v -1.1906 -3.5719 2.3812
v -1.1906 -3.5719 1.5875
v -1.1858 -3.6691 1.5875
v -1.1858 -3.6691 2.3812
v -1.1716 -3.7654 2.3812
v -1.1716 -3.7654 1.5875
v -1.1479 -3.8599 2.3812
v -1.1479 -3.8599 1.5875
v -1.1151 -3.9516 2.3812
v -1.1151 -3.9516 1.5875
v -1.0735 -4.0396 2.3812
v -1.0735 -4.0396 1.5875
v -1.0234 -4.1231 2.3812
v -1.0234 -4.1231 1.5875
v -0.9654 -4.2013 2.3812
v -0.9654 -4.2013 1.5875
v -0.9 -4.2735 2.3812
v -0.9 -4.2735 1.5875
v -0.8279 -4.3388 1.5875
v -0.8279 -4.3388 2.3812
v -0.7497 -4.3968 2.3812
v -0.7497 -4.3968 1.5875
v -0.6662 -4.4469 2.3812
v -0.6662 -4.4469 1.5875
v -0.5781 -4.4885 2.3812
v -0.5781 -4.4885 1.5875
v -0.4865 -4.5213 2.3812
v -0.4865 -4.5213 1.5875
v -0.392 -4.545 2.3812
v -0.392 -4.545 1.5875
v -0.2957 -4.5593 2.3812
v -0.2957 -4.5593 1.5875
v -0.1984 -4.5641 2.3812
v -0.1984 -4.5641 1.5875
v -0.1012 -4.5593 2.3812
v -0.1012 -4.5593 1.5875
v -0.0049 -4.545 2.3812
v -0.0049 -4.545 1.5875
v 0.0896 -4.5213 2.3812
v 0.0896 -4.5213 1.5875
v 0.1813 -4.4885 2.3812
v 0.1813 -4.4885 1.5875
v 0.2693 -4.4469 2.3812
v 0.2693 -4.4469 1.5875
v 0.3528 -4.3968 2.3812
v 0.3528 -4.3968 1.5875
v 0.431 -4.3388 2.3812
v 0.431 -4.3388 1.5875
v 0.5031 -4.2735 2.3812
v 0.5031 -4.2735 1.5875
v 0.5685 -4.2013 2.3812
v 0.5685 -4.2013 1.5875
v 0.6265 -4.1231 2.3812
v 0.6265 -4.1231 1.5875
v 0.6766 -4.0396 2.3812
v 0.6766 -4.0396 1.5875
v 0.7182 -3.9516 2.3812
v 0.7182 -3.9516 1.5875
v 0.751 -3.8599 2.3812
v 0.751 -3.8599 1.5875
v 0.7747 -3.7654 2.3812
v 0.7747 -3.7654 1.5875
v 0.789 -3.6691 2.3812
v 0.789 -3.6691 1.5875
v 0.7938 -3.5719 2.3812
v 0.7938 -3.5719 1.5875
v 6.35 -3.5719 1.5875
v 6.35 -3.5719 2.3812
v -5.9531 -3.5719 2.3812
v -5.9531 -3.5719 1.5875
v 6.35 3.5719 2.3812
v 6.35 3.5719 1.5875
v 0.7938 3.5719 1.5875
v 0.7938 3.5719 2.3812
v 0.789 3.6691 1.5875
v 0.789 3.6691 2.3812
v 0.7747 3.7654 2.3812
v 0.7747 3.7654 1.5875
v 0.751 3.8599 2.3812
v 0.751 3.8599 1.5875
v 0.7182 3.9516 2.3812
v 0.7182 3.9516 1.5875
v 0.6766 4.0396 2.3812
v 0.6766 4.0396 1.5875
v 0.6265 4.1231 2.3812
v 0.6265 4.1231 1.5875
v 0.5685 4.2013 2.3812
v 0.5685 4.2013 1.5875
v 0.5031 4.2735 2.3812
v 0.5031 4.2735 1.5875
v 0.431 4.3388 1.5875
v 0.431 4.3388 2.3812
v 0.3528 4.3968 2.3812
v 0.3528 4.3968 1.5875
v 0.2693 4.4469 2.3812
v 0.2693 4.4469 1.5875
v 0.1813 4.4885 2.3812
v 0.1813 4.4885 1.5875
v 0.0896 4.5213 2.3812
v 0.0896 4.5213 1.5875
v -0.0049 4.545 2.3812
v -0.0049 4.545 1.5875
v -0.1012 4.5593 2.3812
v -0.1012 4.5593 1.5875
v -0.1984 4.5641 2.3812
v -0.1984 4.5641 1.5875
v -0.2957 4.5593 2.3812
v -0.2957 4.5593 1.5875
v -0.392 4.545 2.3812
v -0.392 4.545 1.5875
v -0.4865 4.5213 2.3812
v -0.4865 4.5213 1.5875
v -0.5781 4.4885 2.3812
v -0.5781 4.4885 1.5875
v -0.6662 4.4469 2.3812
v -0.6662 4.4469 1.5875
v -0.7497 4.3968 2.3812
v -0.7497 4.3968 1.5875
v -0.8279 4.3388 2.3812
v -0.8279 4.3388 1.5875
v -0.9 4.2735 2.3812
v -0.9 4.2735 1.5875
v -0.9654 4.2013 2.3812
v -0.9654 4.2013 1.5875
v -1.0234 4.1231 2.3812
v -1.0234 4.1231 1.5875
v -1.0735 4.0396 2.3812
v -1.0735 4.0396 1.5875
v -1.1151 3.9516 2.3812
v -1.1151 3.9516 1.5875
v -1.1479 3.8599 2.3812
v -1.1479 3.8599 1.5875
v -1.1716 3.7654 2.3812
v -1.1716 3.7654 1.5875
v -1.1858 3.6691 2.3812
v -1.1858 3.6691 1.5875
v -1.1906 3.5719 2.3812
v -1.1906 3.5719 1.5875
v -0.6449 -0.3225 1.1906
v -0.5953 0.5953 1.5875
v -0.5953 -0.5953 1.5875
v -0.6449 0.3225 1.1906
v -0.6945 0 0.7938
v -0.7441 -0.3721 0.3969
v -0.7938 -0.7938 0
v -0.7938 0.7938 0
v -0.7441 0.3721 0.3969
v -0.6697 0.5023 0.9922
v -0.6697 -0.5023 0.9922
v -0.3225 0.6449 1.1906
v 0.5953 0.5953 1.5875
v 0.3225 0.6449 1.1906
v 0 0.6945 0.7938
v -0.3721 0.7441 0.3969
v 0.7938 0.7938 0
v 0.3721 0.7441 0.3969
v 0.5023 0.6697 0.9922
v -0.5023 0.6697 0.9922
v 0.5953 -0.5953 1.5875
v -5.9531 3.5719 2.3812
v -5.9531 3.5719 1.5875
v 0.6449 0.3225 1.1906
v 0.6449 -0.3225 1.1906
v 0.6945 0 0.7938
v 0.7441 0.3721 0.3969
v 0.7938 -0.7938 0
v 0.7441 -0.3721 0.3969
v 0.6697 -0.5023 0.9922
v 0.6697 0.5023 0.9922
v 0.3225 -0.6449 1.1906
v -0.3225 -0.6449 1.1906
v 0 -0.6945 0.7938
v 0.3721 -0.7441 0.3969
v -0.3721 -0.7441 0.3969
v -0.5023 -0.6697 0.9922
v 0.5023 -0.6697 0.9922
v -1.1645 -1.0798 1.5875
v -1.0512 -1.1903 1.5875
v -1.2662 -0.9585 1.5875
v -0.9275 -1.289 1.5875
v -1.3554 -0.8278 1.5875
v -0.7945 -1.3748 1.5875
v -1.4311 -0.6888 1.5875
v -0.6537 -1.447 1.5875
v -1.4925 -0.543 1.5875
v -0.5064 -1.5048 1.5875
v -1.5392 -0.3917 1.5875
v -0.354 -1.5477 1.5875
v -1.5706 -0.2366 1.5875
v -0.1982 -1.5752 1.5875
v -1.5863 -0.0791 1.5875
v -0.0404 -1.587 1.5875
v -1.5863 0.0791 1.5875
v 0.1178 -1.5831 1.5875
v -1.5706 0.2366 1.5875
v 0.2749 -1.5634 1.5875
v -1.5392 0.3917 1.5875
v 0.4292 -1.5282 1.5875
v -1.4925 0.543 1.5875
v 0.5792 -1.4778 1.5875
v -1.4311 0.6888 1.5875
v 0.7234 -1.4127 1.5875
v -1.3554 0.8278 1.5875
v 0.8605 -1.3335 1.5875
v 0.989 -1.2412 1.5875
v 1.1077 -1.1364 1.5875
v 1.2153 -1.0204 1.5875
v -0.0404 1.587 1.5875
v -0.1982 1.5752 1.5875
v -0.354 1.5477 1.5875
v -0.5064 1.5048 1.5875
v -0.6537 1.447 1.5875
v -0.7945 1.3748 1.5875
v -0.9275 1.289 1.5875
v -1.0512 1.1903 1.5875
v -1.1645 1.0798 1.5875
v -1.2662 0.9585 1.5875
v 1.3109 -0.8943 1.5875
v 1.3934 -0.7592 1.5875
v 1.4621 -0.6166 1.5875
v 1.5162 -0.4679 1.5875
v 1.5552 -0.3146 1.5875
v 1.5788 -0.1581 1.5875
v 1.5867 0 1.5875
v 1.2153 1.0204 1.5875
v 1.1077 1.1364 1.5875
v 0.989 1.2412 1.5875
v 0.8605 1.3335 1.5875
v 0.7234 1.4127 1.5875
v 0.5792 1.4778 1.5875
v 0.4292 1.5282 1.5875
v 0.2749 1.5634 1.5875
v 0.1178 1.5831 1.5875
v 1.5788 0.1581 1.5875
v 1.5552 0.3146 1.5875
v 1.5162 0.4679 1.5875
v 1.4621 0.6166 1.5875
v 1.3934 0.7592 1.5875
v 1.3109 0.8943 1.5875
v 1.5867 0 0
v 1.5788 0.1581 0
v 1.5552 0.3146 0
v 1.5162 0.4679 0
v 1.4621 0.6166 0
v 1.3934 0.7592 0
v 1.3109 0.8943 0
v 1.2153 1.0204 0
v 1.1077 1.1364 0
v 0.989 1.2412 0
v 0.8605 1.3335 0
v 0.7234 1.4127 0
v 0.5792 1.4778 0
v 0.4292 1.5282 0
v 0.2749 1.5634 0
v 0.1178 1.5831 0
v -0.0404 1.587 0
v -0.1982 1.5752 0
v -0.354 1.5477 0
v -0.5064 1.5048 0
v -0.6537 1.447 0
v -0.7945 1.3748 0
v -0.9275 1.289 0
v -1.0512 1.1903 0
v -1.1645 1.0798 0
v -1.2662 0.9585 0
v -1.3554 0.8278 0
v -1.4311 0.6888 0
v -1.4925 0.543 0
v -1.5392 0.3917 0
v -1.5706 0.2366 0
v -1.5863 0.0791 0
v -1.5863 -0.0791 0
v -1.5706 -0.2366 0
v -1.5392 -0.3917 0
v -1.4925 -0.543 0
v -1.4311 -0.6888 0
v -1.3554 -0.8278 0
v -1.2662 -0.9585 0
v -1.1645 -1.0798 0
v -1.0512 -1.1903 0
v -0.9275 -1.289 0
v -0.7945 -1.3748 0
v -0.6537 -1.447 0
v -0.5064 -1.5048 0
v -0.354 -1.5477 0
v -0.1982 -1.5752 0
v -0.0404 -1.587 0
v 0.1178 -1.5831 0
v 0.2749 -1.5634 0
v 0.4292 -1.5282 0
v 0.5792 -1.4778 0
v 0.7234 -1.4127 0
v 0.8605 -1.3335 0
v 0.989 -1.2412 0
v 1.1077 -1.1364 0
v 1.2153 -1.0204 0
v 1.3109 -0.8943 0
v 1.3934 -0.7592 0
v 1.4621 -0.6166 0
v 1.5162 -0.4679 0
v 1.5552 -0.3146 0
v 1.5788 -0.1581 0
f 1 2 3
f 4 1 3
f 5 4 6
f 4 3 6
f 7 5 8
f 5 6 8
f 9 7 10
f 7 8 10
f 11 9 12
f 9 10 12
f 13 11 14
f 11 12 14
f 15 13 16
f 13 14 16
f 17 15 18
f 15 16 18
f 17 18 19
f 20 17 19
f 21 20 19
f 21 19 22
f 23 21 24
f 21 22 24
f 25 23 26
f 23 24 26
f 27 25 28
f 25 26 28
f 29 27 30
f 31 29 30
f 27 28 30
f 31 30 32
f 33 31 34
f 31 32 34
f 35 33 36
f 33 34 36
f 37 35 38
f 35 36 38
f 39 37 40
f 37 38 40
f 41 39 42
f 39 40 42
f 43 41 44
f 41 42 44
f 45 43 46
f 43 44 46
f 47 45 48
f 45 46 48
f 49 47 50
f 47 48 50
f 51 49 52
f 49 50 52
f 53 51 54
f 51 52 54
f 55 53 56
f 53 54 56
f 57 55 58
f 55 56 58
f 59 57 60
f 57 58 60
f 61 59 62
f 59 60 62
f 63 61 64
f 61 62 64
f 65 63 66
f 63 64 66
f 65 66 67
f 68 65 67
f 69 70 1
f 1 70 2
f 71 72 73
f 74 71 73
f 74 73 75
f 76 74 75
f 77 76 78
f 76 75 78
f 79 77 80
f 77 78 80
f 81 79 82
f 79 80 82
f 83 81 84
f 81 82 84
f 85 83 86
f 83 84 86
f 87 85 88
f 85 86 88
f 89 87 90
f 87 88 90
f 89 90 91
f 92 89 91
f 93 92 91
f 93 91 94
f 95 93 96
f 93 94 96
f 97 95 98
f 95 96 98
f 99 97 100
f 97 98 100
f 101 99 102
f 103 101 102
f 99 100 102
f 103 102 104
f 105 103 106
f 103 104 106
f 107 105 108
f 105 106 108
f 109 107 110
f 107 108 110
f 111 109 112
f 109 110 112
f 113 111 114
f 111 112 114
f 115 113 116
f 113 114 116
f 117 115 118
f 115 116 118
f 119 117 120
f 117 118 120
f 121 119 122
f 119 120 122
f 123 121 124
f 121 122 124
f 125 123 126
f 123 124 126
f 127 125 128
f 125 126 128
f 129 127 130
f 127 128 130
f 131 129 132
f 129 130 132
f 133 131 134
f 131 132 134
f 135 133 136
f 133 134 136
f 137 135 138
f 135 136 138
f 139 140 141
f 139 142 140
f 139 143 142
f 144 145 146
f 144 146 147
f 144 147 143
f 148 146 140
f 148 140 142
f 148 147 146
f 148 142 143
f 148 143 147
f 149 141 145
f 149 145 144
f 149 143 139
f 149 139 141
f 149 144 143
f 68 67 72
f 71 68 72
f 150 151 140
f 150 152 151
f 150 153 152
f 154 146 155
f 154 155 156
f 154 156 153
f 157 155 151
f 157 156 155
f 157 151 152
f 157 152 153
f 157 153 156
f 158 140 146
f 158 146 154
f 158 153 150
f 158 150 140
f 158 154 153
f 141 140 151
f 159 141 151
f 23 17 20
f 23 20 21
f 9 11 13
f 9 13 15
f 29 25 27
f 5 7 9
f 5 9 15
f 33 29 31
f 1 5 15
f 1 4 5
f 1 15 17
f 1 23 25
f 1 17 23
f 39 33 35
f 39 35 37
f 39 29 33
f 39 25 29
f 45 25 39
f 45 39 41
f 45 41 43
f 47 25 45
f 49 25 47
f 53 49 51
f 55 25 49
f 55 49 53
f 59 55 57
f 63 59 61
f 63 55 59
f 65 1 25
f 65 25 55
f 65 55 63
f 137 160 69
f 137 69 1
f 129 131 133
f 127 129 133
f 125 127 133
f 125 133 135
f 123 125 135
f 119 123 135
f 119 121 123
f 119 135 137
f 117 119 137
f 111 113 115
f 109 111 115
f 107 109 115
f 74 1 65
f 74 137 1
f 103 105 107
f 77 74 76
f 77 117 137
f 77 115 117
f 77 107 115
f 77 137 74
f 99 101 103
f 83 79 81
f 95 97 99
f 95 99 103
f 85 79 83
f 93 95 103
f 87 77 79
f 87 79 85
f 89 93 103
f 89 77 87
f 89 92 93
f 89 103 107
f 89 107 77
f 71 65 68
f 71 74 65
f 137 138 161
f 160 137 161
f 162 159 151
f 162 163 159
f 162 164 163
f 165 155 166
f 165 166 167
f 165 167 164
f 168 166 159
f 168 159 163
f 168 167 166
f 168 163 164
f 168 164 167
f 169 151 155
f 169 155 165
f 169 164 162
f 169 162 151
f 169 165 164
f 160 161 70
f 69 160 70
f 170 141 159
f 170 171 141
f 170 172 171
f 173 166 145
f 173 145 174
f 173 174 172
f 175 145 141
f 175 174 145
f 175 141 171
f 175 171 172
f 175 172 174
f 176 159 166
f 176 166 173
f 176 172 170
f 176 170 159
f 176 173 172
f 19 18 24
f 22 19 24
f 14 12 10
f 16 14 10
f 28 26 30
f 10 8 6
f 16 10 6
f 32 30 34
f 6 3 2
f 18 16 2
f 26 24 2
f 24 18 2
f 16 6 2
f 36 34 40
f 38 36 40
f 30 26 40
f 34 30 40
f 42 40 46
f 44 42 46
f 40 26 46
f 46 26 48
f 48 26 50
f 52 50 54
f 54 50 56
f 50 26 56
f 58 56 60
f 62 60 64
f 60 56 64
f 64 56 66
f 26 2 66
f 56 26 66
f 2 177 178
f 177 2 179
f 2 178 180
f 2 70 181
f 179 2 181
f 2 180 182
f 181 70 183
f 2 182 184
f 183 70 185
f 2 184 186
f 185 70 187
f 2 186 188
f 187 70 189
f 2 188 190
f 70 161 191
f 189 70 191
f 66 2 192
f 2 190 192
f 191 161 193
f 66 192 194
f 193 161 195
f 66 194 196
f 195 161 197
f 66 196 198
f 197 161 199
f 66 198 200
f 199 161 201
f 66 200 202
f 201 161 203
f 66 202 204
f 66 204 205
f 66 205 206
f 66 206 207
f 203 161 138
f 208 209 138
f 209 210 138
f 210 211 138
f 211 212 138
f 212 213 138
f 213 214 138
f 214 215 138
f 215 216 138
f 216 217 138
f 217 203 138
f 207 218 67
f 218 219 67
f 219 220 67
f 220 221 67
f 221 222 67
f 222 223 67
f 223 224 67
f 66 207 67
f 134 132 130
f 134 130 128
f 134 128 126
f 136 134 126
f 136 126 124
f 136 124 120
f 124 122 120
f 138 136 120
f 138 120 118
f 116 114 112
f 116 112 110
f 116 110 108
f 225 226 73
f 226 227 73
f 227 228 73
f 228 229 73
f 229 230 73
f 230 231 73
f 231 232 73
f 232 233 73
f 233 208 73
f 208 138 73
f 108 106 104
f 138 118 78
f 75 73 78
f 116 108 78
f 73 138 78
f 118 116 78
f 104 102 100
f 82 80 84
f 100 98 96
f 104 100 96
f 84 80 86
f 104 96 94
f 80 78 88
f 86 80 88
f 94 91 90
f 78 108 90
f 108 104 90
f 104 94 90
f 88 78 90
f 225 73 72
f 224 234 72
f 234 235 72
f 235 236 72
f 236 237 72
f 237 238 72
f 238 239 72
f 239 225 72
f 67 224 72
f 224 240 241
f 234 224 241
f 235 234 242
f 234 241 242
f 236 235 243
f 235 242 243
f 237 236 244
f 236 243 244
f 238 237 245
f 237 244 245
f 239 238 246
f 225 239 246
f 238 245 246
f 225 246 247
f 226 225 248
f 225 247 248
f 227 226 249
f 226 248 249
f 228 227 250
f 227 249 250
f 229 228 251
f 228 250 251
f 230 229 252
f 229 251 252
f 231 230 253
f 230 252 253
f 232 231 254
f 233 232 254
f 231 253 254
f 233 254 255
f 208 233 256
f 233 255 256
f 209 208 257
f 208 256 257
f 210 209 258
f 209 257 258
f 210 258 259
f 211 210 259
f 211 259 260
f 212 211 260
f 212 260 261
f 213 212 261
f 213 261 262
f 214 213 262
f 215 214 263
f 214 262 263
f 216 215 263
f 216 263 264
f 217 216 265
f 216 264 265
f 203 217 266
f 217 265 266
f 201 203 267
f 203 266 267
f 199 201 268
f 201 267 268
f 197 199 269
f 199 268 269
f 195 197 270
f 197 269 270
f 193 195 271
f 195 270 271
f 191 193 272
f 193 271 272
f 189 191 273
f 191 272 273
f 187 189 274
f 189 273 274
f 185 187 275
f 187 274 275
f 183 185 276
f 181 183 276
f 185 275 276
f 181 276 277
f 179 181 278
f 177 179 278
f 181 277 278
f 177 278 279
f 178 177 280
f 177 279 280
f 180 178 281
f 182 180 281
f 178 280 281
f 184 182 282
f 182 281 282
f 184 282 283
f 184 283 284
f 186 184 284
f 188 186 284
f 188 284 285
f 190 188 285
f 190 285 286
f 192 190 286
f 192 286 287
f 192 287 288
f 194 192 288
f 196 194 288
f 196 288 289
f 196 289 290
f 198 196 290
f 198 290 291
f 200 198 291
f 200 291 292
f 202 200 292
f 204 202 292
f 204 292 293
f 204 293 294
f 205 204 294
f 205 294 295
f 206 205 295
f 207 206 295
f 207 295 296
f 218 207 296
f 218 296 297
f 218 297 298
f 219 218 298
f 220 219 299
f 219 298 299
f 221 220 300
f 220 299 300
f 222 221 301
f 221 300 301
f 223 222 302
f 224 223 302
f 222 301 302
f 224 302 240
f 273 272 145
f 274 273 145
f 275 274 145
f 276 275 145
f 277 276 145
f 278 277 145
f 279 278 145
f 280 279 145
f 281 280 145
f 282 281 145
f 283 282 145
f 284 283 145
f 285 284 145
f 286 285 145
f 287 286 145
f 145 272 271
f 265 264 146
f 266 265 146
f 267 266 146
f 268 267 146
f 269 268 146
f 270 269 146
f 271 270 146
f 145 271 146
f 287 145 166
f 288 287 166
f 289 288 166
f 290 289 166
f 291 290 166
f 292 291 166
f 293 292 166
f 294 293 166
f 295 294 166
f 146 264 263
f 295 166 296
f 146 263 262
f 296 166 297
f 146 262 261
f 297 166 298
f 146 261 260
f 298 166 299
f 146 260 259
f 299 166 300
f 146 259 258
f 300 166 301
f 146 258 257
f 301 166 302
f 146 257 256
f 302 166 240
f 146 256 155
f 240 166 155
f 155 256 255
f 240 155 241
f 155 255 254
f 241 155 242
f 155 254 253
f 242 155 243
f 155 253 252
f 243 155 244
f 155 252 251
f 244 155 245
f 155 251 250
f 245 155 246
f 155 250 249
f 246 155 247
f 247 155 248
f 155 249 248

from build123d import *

# Parameters (mm, degrees)
F0_R     = 1.5875
F1_DEPTH = 1.5875
F2_W     = 1.190625
F2_H     = 1.190624
F3_W     = 1.5875
F3_H     = 1.5875
F6_DEPTH = 0.79375


with BuildPart() as f1:
    # F0 (on Top) → F1 (new body)
    with BuildSketch(Plane.XY):
        with Locations((-0.000785, 0)):
            Circle(F0_R)
    extrude(amount=F1_DEPTH)

    # F2 (on face) → F4 section 0
    with BuildSketch(Plane.XY.offset(1.5875)):
        with Locations((-1e-06, 0)):
            Rectangle(F2_W, F2_H)
    # F3 (on face) → F4 section 1
    with BuildSketch(Plane(origin=(0, 0, 0), x_dir=(1, 0, 0), z_dir=(0, 0, -1))):
        Rectangle(F3_W, F3_H)
    loft(mode=Mode.SUBTRACT)

    # F5 (on face) → F6 (join)
    with BuildSketch(Plane.XY.offset(1.5875)):
        with BuildLine():
            Line((-5.953125, 3.571875), (-5.953125, -3.571875))
            Line((-5.953125, -3.571875), (-1.190625, -3.571875))
            ThreePointArc((-1.190625, -3.571875), (-0.198438, -4.564063), (0.79375, -3.571875))
            Line((0.79375, -3.571875), (6.35, -3.571875))
            Line((6.35, -3.571875), (6.35, 3.571875))
            Line((6.35, 3.571875), (0.79375, 3.571875))
            ThreePointArc((0.79375, 3.571875), (-0.198437, 4.564063), (-1.190625, 3.571875))
            Line((-1.190625, 3.571875), (-5.953125, 3.571875))
        make_face()
    extrude(amount=F6_DEPTH)


solid = f1.part
